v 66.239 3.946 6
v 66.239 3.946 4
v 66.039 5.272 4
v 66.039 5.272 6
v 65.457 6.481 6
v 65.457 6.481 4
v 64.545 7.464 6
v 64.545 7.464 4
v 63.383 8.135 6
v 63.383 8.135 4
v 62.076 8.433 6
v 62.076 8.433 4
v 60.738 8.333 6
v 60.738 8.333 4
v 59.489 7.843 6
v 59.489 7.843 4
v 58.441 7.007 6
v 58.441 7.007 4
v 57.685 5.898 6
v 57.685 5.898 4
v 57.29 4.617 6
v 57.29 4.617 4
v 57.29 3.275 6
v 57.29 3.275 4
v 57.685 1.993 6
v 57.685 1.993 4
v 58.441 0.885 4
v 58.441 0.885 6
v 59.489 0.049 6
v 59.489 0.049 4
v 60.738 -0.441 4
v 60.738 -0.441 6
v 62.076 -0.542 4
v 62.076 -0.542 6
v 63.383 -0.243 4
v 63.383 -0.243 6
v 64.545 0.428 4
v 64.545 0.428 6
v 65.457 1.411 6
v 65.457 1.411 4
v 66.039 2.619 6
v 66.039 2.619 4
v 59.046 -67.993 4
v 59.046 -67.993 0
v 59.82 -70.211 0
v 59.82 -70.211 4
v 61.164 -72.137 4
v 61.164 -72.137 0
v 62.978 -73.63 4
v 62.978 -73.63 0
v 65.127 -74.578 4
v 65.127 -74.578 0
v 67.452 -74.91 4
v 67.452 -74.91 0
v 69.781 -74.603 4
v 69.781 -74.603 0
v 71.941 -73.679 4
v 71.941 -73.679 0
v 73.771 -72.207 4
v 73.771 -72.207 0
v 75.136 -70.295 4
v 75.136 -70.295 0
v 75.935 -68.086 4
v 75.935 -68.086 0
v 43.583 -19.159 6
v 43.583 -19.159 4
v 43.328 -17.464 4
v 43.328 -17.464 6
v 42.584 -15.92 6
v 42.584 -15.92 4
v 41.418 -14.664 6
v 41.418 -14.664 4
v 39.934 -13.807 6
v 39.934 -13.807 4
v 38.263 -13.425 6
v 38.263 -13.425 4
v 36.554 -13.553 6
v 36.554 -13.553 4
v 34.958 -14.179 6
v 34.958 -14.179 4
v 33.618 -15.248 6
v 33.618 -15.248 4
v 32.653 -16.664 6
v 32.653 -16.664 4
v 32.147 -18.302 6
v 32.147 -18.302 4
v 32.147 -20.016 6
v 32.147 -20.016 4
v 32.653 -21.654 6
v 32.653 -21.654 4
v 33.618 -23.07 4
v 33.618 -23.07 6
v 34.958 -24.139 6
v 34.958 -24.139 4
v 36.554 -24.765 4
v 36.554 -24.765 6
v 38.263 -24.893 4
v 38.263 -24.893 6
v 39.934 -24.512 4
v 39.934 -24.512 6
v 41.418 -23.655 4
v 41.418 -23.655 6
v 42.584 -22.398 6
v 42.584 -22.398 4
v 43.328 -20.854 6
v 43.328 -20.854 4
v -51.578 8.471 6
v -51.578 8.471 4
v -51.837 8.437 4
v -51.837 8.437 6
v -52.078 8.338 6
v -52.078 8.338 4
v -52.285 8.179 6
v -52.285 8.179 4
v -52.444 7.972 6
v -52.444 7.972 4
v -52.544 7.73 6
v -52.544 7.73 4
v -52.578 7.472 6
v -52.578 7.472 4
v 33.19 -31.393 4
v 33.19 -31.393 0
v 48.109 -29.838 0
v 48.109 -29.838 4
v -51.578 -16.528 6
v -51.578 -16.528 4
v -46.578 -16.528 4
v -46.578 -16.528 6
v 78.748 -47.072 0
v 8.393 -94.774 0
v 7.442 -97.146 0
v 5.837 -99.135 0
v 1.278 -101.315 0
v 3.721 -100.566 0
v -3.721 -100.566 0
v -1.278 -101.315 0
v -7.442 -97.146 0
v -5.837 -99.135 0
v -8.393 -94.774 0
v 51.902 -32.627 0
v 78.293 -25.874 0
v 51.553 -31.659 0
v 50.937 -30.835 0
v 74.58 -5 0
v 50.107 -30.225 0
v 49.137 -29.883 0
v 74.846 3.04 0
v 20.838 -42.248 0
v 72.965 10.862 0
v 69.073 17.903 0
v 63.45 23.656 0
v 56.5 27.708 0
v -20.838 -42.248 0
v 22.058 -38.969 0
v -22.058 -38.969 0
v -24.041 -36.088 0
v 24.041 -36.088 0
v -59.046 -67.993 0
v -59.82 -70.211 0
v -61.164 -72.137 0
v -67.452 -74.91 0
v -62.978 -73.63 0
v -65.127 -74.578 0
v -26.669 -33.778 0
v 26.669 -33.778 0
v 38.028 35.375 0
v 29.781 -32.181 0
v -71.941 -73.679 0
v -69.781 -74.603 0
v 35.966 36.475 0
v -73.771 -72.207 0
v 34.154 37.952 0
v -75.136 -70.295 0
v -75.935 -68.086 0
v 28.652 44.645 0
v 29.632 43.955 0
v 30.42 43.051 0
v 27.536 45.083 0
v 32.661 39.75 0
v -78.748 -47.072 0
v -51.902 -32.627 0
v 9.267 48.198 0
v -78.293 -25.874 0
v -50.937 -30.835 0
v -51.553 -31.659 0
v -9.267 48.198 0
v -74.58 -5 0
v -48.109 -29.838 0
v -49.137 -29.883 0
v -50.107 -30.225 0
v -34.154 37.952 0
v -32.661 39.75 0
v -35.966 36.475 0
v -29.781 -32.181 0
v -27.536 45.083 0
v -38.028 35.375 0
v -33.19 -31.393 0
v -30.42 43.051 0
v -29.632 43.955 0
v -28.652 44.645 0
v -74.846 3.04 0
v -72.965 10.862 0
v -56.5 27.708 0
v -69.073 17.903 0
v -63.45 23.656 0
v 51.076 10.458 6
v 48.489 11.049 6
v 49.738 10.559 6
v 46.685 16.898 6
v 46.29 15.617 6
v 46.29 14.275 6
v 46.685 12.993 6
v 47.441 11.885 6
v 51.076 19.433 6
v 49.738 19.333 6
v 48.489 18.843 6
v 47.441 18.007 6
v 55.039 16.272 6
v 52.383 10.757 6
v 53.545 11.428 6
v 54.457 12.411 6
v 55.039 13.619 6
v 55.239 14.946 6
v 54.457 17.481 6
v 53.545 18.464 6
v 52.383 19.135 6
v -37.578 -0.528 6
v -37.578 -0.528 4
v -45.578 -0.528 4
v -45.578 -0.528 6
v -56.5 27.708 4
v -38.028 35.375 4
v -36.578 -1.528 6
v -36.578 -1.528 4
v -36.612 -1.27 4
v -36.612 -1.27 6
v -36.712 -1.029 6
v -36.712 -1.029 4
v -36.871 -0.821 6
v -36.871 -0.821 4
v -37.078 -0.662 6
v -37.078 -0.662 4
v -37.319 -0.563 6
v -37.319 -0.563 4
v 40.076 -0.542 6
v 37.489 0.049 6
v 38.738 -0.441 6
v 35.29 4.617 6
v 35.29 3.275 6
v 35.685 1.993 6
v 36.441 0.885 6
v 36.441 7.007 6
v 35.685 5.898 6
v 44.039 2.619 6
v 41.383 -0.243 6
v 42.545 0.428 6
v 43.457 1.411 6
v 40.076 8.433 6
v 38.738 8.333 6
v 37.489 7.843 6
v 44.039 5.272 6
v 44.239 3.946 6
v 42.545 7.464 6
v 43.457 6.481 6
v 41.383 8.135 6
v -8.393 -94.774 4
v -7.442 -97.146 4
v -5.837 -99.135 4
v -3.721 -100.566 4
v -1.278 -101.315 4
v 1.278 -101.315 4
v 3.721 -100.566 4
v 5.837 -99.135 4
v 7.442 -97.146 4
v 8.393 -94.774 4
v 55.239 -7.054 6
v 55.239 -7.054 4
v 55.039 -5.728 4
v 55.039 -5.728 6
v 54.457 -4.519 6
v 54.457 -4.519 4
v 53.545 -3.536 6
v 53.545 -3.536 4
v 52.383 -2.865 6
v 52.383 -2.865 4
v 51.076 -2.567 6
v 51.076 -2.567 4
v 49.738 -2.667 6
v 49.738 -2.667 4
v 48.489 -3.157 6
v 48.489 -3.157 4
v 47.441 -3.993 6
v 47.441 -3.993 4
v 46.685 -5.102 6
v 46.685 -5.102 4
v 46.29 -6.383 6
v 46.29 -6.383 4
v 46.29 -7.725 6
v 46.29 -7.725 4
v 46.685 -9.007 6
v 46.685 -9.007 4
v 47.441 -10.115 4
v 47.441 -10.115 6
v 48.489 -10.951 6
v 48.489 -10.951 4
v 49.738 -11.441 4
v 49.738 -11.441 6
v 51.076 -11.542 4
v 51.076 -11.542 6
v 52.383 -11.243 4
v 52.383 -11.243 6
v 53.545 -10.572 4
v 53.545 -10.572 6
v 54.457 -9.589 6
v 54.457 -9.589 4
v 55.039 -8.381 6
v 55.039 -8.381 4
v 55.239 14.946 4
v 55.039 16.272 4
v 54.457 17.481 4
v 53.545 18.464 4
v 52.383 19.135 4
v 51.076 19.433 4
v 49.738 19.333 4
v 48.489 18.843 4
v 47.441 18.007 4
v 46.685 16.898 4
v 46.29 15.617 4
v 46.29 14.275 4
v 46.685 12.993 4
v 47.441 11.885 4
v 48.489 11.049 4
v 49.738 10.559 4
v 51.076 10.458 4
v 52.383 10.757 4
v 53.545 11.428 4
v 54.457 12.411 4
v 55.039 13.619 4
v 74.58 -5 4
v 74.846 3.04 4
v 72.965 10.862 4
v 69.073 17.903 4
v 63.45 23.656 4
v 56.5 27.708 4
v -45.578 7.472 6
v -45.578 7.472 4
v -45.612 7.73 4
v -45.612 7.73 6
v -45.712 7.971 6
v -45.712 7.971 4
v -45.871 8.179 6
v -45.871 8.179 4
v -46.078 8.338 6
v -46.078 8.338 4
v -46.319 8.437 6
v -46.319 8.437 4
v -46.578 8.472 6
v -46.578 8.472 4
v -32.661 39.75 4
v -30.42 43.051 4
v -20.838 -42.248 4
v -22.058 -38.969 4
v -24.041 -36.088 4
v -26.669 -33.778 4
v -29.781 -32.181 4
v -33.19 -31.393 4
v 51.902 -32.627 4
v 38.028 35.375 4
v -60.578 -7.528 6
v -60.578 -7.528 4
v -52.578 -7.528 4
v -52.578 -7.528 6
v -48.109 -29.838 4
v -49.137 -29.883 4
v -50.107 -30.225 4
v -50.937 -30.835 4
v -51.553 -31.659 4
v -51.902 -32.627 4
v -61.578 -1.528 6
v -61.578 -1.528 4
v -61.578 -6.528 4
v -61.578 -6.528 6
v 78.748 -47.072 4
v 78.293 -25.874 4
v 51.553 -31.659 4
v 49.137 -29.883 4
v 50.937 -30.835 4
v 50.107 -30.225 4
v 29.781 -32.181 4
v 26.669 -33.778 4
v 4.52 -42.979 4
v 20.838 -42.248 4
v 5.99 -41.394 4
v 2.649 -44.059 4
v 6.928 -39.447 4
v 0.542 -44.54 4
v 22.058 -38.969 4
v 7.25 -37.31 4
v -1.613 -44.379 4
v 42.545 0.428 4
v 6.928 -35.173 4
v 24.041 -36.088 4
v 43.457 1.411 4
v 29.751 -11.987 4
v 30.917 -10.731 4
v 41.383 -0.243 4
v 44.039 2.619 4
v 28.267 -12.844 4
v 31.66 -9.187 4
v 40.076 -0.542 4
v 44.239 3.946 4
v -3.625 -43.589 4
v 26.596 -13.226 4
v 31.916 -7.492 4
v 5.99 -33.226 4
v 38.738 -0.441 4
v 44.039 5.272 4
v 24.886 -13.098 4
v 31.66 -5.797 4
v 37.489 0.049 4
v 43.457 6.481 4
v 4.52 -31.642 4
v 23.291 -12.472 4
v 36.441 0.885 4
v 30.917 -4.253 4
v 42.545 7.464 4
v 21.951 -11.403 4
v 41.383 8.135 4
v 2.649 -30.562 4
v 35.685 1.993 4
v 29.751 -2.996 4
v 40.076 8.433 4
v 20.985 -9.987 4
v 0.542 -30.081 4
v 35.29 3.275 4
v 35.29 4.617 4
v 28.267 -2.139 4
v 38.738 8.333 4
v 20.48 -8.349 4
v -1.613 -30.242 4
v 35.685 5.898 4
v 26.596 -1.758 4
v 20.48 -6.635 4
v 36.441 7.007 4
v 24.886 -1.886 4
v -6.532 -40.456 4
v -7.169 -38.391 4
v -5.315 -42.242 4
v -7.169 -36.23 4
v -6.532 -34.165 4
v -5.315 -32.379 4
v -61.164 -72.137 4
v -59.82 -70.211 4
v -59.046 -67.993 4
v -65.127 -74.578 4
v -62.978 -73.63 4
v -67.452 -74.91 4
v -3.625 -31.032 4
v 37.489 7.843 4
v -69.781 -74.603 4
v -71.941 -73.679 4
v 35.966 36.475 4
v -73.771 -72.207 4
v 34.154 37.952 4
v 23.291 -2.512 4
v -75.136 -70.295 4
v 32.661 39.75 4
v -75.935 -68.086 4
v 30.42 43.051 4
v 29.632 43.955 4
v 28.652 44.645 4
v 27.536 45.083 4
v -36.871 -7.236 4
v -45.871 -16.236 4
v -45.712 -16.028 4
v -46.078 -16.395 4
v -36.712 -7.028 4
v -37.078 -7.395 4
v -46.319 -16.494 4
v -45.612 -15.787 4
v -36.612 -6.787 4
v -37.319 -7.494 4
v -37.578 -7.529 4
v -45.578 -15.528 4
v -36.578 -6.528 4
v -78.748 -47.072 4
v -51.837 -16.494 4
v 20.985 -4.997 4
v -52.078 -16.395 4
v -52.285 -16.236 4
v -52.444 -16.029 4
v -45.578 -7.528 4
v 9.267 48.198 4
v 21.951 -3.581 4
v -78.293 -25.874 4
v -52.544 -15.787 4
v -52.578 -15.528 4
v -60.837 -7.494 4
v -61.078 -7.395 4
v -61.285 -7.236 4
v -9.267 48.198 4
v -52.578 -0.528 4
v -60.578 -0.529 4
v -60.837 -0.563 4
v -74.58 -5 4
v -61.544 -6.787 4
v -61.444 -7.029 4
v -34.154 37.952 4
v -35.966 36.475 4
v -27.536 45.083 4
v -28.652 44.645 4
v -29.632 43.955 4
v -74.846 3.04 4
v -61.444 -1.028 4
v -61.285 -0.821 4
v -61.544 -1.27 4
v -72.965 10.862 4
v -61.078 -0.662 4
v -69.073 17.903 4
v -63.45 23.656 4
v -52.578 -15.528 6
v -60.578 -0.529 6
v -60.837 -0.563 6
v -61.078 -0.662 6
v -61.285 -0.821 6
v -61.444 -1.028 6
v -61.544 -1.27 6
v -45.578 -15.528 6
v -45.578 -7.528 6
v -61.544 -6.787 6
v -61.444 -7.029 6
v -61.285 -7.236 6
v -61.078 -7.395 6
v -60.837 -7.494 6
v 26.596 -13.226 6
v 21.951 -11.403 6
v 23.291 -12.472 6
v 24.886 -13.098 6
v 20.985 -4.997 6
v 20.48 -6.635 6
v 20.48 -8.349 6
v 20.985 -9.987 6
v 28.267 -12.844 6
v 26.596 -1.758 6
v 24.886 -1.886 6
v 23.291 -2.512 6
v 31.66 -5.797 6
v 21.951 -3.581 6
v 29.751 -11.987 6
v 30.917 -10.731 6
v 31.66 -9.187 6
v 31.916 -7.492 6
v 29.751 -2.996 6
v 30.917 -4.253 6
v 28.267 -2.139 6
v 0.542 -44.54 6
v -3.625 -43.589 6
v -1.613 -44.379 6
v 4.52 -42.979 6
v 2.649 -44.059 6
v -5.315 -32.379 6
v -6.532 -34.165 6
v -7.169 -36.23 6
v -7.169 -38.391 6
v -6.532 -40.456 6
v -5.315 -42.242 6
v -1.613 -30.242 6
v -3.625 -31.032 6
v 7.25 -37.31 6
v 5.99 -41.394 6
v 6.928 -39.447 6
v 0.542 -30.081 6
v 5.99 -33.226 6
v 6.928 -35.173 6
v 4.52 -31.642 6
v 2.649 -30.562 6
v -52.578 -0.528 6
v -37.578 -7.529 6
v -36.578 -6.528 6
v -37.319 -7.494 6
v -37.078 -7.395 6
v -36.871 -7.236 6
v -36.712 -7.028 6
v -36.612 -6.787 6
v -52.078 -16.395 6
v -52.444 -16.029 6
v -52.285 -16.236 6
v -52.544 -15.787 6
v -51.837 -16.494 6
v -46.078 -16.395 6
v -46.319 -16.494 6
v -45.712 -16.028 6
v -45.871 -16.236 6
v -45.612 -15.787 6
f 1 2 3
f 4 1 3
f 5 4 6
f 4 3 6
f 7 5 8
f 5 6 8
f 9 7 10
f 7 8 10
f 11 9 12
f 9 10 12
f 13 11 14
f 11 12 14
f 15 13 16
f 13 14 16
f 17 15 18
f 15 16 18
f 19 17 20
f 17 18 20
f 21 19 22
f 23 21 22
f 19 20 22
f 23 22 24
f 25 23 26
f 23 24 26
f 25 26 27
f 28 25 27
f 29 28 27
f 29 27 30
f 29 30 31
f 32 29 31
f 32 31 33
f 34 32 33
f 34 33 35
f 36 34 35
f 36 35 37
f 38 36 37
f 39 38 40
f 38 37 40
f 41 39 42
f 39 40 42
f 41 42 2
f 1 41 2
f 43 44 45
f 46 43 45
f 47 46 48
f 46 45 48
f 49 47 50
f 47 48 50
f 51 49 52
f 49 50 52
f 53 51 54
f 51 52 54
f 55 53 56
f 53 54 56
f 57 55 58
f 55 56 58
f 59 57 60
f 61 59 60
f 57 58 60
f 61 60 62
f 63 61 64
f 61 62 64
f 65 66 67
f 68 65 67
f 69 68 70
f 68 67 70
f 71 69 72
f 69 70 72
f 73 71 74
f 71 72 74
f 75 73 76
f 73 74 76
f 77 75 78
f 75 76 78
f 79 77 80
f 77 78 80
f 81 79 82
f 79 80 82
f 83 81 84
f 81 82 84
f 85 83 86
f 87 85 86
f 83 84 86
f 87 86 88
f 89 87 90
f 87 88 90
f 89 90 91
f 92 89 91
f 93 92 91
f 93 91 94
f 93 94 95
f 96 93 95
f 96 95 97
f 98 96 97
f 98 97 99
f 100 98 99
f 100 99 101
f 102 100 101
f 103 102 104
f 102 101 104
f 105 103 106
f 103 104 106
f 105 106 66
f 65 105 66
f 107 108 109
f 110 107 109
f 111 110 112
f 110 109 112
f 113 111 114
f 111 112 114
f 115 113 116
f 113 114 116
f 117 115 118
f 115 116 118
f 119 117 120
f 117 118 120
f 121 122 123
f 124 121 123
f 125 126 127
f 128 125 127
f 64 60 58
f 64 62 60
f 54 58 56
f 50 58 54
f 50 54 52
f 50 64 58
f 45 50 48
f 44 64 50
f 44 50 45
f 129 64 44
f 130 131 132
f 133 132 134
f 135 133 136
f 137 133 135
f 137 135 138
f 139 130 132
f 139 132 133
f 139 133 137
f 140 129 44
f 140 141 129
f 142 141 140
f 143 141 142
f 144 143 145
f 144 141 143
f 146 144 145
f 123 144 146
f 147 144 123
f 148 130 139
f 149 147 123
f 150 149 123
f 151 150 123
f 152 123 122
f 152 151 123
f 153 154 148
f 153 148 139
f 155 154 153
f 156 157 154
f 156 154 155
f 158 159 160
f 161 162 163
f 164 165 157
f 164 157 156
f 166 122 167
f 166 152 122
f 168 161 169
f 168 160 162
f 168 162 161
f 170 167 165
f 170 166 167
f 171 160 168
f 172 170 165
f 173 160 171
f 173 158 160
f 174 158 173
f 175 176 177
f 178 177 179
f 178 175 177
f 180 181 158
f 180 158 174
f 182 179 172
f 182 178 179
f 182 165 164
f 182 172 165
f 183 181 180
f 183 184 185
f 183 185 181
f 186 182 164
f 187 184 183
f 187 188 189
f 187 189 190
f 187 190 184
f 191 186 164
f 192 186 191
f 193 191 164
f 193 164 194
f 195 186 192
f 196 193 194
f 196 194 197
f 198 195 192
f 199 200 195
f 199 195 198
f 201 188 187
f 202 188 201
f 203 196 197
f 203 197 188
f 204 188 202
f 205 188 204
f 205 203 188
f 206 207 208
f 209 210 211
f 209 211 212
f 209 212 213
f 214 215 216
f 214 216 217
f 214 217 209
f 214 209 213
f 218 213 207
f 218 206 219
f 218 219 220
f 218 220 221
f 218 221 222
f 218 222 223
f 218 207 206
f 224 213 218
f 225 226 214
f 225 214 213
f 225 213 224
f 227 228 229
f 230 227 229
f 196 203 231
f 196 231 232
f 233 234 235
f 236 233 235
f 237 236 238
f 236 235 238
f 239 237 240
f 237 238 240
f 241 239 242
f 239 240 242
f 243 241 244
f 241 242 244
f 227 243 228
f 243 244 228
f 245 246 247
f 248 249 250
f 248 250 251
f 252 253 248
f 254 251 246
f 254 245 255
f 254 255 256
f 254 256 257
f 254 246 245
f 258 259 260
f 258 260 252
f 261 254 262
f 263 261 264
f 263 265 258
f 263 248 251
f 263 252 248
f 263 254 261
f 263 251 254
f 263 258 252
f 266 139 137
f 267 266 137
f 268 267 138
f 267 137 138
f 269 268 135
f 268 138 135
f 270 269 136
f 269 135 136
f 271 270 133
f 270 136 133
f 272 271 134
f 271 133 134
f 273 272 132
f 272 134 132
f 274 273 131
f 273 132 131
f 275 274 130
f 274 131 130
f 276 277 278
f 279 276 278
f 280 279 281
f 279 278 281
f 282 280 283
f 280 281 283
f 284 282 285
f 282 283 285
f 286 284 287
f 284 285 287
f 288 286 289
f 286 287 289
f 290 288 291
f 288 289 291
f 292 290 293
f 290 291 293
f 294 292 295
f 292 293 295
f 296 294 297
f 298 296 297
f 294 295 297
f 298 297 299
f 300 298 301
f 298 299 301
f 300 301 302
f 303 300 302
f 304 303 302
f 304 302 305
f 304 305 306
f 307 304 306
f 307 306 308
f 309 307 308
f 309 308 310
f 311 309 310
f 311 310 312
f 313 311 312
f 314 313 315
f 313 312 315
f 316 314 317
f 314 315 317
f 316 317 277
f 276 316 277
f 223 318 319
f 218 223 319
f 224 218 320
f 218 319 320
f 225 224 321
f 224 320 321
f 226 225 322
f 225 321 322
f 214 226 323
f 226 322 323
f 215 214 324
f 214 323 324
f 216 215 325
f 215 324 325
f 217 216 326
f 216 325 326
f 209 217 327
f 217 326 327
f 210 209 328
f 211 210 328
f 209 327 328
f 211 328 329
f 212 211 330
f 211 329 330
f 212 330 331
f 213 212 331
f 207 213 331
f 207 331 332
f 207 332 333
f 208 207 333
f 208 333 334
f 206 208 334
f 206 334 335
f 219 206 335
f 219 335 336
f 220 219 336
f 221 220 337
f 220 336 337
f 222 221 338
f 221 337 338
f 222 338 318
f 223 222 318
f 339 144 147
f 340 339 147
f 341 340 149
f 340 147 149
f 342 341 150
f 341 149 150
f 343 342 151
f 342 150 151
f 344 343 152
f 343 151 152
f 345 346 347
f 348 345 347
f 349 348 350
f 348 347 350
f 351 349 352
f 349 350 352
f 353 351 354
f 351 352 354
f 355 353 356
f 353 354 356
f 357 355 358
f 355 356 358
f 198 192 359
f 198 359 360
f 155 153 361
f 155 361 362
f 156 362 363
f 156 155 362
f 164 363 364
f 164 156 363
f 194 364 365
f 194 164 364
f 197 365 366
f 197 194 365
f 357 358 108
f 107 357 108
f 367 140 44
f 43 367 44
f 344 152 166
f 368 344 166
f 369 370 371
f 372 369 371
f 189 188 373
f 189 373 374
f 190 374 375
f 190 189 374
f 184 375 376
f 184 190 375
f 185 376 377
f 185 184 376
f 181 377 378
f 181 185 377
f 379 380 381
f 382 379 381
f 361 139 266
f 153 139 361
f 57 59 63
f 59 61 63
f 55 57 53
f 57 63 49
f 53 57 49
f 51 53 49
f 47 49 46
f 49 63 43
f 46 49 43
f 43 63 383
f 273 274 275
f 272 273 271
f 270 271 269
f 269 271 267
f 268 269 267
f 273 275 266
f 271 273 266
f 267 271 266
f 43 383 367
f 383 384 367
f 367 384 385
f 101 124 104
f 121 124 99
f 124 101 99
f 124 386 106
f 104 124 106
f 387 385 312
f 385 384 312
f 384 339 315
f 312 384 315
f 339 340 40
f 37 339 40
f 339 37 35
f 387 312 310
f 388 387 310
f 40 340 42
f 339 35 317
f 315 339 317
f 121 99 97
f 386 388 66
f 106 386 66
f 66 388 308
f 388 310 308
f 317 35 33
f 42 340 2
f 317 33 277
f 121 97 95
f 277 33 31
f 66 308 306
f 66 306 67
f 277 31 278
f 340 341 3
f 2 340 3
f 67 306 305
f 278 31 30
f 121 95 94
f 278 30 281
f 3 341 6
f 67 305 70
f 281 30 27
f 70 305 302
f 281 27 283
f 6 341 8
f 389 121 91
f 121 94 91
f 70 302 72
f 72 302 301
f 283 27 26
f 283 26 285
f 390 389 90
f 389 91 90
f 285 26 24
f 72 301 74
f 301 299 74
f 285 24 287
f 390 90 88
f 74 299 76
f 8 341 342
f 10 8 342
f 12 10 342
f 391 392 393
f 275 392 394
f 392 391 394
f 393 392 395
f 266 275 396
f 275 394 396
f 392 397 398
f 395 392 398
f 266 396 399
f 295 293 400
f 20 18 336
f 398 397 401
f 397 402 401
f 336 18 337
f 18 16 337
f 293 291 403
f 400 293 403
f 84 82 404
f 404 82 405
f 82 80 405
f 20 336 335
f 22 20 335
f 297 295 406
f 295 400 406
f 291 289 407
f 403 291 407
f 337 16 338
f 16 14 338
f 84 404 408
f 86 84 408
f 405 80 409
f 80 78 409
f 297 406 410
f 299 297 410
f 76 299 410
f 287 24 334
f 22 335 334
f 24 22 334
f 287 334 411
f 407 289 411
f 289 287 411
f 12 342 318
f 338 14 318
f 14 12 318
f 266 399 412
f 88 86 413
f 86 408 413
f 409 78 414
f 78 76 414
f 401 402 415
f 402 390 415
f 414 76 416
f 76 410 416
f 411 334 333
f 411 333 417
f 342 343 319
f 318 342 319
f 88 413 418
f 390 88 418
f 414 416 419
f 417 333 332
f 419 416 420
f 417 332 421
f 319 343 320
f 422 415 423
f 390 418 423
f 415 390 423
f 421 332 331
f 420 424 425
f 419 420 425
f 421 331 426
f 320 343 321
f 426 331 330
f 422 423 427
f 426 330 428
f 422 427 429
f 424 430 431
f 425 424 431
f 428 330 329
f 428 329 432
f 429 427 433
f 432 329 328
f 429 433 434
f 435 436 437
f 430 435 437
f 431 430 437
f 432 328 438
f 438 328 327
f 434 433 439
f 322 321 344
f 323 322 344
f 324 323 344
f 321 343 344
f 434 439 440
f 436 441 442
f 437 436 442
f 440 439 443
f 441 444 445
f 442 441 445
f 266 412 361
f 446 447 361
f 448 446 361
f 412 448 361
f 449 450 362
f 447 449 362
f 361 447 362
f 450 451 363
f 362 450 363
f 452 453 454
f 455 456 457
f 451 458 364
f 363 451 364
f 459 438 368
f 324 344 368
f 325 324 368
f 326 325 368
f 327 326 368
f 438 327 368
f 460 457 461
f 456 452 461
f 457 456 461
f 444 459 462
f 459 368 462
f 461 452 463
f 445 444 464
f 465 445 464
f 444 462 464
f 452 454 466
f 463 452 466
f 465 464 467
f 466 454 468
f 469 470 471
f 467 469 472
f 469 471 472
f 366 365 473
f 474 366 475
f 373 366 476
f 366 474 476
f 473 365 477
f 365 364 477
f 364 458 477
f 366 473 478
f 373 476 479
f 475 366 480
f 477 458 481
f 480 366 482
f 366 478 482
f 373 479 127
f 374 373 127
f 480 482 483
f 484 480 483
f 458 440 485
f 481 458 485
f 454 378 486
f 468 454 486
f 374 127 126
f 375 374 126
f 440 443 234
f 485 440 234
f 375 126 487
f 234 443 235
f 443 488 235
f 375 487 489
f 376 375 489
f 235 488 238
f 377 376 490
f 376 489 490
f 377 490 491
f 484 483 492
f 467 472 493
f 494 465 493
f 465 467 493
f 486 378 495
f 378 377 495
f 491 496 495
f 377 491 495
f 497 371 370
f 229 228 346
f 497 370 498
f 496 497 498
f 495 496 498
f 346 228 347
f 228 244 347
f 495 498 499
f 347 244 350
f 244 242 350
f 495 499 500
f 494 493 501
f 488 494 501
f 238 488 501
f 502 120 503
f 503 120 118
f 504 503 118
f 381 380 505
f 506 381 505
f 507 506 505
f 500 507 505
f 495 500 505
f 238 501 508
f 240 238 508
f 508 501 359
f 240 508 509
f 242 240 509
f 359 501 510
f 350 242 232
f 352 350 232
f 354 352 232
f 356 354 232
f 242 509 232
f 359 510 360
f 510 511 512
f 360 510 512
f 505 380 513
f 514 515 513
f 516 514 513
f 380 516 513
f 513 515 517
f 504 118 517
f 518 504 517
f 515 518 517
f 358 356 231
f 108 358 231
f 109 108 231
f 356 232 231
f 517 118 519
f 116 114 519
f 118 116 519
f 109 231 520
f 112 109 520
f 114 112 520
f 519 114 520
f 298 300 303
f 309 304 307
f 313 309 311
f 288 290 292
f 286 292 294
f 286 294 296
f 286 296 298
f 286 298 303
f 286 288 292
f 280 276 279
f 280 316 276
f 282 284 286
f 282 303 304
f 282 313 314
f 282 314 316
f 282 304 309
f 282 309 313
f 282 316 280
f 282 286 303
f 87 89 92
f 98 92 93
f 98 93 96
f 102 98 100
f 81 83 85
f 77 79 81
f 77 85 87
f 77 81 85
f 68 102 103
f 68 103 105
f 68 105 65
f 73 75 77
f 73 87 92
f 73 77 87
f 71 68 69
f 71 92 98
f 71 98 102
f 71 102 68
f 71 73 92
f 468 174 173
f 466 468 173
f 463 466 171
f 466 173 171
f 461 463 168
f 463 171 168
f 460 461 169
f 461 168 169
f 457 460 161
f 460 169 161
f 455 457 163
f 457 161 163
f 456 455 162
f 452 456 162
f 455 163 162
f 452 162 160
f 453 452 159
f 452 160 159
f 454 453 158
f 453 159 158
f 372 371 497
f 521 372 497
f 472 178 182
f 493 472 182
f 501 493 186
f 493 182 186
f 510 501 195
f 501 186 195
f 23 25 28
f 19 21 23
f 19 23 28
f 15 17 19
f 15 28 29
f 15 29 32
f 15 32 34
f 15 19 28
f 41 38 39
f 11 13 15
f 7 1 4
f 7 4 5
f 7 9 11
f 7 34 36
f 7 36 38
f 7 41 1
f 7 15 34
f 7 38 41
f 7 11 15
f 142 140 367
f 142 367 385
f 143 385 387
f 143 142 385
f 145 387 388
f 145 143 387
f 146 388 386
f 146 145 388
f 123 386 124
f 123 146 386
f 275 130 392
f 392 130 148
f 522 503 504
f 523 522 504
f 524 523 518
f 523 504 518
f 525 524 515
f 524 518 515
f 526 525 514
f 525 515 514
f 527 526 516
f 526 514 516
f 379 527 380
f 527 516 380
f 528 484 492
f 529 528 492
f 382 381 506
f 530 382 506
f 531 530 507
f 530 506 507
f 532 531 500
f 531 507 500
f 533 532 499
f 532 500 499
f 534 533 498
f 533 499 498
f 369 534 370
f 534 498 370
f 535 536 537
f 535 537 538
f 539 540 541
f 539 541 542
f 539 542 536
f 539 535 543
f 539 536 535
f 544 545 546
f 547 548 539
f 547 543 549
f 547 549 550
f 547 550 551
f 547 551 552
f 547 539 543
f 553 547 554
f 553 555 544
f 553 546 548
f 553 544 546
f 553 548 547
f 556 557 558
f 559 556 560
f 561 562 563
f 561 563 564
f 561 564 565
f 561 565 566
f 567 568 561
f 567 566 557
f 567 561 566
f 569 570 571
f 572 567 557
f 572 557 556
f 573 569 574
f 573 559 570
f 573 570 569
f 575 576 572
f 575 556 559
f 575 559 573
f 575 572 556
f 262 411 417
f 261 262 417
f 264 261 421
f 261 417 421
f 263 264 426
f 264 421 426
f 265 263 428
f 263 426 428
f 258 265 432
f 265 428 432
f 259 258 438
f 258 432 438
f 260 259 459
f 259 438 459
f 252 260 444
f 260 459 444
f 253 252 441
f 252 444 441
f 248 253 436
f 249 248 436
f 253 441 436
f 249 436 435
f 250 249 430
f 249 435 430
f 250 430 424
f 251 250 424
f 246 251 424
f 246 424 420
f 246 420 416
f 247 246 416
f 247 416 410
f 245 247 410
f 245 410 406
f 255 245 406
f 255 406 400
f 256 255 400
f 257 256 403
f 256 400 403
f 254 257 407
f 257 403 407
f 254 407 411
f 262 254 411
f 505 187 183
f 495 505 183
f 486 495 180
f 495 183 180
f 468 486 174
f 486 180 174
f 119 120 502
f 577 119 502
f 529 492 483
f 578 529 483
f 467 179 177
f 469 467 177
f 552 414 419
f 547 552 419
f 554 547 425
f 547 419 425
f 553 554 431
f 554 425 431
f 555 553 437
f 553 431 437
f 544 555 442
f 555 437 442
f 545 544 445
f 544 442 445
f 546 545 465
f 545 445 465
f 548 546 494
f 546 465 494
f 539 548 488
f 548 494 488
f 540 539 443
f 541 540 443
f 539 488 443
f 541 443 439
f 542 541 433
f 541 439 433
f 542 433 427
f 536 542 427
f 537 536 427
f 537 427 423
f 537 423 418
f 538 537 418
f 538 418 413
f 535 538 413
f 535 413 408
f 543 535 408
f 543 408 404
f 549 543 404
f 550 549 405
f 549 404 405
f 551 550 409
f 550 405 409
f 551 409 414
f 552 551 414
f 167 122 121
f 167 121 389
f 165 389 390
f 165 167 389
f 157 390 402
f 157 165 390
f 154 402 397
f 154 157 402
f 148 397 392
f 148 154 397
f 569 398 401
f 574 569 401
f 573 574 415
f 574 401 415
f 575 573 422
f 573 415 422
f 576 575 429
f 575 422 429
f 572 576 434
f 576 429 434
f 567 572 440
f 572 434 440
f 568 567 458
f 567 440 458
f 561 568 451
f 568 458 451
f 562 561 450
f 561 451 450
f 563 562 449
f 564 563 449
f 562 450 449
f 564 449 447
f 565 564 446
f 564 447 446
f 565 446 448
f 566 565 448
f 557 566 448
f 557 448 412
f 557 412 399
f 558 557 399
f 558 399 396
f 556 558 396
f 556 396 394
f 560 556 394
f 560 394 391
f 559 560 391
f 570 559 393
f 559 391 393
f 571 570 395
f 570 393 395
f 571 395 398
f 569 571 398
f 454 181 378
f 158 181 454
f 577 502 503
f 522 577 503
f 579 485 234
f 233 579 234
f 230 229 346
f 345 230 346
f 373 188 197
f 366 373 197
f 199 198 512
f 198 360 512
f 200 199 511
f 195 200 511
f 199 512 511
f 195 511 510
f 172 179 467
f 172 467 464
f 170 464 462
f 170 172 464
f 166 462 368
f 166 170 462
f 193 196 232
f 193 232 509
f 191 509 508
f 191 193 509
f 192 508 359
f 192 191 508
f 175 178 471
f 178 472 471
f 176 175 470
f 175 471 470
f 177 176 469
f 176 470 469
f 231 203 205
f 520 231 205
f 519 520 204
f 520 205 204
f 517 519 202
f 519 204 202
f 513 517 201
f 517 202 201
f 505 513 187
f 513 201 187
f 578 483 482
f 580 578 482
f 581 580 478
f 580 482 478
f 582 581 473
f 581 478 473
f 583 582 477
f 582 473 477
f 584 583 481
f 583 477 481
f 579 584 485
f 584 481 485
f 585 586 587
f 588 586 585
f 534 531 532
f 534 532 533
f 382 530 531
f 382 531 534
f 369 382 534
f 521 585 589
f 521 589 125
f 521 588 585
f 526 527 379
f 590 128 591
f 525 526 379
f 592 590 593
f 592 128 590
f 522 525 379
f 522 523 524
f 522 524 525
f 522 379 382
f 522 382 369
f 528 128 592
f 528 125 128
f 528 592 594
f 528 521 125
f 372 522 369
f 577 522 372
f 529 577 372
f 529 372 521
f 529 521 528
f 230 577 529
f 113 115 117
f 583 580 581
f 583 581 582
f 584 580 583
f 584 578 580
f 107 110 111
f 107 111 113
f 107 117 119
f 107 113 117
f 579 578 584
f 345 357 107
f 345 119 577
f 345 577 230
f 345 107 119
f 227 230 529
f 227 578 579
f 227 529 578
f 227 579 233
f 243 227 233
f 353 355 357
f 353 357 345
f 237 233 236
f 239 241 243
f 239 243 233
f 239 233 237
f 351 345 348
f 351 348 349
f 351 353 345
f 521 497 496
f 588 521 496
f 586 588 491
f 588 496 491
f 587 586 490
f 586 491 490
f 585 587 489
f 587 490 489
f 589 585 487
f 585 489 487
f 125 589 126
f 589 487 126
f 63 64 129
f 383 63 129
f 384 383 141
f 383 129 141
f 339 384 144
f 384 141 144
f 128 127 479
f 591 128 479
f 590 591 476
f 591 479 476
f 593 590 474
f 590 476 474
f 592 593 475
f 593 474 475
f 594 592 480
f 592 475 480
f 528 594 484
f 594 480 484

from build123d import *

# Parameters (mm, degrees)
PAD_DEPTH     = 4
FILLET_R      = 5
SKETCH001_R   = 7.25
SKETCH001_R_2 = 5.75
SKETCH001_R_3 = 4.5
PAD001_DEPTH  = 2


with BuildPart() as part:
    # Sketch → Pad (new body)
    with BuildSketch(Plane.XY):
        with BuildLine():
            Line((-8.392638, -94.773898), (-20.838068, -42.247688))
            ThreePointArc((-20.838068, -42.247688), (-25.283831, -34.851678), (-33.189712, -31.392947))
            Line((-48.108948, -29.838473), (-33.189712, -31.392947))
            ThreePointArc((-48.108948, -29.838473), (-50.544507, -30.499468), (-51.902377, -32.626684))
            Line((-51.902377, -32.626684), (-59.045734, -67.993001))
            ThreePointArc((-75.934928, -68.086092), (-67.452461, -74.910237), (-59.045734, -67.993001))
            ThreePointArc((-74.580399, -5), (-78.929877, -36.4642), (-75.934928, -68.086092))
            ThreePointArc((-56.5, 27.708302), (-71.255629, 14.513509), (-74.580399, -5))
            Line((-56.5, 27.708302), (-38.027799, 35.374969))
            ThreePointArc((-38.027799, 35.374969), (-35.024382, 37.16978), (-32.660861, 39.74963))
            Line((-32.660861, 39.74963), (-29.375, 44.589632))
            ThreePointArc((29.375, 44.589632), (0, 48.589632), (-29.375, 44.589632))
            Line((32.660861, 39.74963), (29.375, 44.589632))
            ThreePointArc((32.660861, 39.74963), (35.024382, 37.16978), (38.027799, 35.374969))
            Line((56.5, 27.708302), (38.027799, 35.374969))
            ThreePointArc((74.580399, -5), (71.255629, 14.513509), (56.5, 27.708302))
            ThreePointArc((75.934928, -68.086092), (78.929877, -36.4642), (74.580399, -5))
            ThreePointArc((59.045729, -67.992978), (67.452449, -74.910237), (75.934928, -68.086092))
            Line((51.902377, -32.626684), (59.045729, -67.992978))
            ThreePointArc((51.902377, -32.626684), (50.544507, -30.499468), (48.108948, -29.838472))
            Line((33.189712, -31.392947), (48.108948, -29.838472))
            ThreePointArc((33.189712, -31.392947), (25.283831, -34.851678), (20.838068, -42.247688))
            Line((8.392638, -94.773899), (20.838068, -42.247688))
            ThreePointArc((-8.392638, -94.773898), (0, -101.410368), (8.392638, -94.773899))
        make_face()
    extrude(amount=PAD_DEPTH)

    # Fillet
    fillet_edges = [part.edges().sort_by_distance(p)[0] for p in [
        (29.375, 44.589632, 2),
        (-29.375, 44.589632, 2),
    ]]
    fillet(fillet_edges, radius=FILLET_R)

    # Sketch001 (on Face26 of Pad) → Pad001 (join)
    with BuildSketch(Plane.XY.offset(4)):
        with Locations((0, -37.310368)):
            Circle(SKETCH001_R)
        with Locations((37.833116, -19.159138)):
            Circle(SKETCH001_R_2)
        with Locations((26.165854, -7.491876)):
            Circle(SKETCH001_R_2)
        with Locations((50.739369, 14.945877)):
            Circle(SKETCH001_R_3)
        with Locations((61.739369, 3.945877)):
            Circle(SKETCH001_R_3)
        with Locations((50.739369, -7.054123)):
            Circle(SKETCH001_R_3)
        with Locations((39.739369, 3.945877)):
            Circle(SKETCH001_R_3)
        with BuildLine():
            Line((-45.578289, -0.5285), (-45.578289, 7.4715))
            ThreePointArc((-45.578289, 7.4715), (-45.871183, 8.178607), (-46.578289, 8.4715))
            Line((-46.578289, 8.4715), (-51.578289, 8.4715))
            ThreePointArc((-51.578289, 8.4715), (-52.285396, 8.178607), (-52.578289, 7.4715))
            Line((-52.578289, 7.4715), (-52.578289, -0.5285))
            Line((-52.578289, -0.5285), (-60.578289, -0.5285))
            ThreePointArc((-60.578289, -0.5285), (-61.285396, -0.821393), (-61.578289, -1.5285))
            Line((-61.578289, -1.5285), (-61.578289, -6.5285))
            ThreePointArc((-61.578289, -6.5285), (-61.285396, -7.235607), (-60.578289, -7.5285))
            Line((-60.578289, -7.5285), (-52.578289, -7.5285))
            Line((-52.578289, -7.5285), (-52.578289, -15.5285))
            ThreePointArc((-52.578289, -15.5285), (-52.285396, -16.235607), (-51.578289, -16.5285))
            Line((-51.578289, -16.5285), (-46.578289, -16.5285))
            ThreePointArc((-46.578289, -16.5285), (-45.871183, -16.235607), (-45.578289, -15.5285))
            Line((-45.578289, -15.5285), (-45.578289, -7.5285))
            Line((-45.578289, -7.5285), (-37.578289, -7.5285))
            ThreePointArc((-37.578289, -7.5285), (-36.871183, -7.235607), (-36.578289, -6.5285))
            Line((-36.578289, -6.5285), (-36.578289, -1.5285))
            ThreePointArc((-36.578289, -1.5285), (-36.871183, -0.821393), (-37.578289, -0.5285))
            Line((-37.578289, -0.5285), (-45.578289, -0.5285))
        make_face()
    extrude(amount=PAD001_DEPTH)


solid = part.part
